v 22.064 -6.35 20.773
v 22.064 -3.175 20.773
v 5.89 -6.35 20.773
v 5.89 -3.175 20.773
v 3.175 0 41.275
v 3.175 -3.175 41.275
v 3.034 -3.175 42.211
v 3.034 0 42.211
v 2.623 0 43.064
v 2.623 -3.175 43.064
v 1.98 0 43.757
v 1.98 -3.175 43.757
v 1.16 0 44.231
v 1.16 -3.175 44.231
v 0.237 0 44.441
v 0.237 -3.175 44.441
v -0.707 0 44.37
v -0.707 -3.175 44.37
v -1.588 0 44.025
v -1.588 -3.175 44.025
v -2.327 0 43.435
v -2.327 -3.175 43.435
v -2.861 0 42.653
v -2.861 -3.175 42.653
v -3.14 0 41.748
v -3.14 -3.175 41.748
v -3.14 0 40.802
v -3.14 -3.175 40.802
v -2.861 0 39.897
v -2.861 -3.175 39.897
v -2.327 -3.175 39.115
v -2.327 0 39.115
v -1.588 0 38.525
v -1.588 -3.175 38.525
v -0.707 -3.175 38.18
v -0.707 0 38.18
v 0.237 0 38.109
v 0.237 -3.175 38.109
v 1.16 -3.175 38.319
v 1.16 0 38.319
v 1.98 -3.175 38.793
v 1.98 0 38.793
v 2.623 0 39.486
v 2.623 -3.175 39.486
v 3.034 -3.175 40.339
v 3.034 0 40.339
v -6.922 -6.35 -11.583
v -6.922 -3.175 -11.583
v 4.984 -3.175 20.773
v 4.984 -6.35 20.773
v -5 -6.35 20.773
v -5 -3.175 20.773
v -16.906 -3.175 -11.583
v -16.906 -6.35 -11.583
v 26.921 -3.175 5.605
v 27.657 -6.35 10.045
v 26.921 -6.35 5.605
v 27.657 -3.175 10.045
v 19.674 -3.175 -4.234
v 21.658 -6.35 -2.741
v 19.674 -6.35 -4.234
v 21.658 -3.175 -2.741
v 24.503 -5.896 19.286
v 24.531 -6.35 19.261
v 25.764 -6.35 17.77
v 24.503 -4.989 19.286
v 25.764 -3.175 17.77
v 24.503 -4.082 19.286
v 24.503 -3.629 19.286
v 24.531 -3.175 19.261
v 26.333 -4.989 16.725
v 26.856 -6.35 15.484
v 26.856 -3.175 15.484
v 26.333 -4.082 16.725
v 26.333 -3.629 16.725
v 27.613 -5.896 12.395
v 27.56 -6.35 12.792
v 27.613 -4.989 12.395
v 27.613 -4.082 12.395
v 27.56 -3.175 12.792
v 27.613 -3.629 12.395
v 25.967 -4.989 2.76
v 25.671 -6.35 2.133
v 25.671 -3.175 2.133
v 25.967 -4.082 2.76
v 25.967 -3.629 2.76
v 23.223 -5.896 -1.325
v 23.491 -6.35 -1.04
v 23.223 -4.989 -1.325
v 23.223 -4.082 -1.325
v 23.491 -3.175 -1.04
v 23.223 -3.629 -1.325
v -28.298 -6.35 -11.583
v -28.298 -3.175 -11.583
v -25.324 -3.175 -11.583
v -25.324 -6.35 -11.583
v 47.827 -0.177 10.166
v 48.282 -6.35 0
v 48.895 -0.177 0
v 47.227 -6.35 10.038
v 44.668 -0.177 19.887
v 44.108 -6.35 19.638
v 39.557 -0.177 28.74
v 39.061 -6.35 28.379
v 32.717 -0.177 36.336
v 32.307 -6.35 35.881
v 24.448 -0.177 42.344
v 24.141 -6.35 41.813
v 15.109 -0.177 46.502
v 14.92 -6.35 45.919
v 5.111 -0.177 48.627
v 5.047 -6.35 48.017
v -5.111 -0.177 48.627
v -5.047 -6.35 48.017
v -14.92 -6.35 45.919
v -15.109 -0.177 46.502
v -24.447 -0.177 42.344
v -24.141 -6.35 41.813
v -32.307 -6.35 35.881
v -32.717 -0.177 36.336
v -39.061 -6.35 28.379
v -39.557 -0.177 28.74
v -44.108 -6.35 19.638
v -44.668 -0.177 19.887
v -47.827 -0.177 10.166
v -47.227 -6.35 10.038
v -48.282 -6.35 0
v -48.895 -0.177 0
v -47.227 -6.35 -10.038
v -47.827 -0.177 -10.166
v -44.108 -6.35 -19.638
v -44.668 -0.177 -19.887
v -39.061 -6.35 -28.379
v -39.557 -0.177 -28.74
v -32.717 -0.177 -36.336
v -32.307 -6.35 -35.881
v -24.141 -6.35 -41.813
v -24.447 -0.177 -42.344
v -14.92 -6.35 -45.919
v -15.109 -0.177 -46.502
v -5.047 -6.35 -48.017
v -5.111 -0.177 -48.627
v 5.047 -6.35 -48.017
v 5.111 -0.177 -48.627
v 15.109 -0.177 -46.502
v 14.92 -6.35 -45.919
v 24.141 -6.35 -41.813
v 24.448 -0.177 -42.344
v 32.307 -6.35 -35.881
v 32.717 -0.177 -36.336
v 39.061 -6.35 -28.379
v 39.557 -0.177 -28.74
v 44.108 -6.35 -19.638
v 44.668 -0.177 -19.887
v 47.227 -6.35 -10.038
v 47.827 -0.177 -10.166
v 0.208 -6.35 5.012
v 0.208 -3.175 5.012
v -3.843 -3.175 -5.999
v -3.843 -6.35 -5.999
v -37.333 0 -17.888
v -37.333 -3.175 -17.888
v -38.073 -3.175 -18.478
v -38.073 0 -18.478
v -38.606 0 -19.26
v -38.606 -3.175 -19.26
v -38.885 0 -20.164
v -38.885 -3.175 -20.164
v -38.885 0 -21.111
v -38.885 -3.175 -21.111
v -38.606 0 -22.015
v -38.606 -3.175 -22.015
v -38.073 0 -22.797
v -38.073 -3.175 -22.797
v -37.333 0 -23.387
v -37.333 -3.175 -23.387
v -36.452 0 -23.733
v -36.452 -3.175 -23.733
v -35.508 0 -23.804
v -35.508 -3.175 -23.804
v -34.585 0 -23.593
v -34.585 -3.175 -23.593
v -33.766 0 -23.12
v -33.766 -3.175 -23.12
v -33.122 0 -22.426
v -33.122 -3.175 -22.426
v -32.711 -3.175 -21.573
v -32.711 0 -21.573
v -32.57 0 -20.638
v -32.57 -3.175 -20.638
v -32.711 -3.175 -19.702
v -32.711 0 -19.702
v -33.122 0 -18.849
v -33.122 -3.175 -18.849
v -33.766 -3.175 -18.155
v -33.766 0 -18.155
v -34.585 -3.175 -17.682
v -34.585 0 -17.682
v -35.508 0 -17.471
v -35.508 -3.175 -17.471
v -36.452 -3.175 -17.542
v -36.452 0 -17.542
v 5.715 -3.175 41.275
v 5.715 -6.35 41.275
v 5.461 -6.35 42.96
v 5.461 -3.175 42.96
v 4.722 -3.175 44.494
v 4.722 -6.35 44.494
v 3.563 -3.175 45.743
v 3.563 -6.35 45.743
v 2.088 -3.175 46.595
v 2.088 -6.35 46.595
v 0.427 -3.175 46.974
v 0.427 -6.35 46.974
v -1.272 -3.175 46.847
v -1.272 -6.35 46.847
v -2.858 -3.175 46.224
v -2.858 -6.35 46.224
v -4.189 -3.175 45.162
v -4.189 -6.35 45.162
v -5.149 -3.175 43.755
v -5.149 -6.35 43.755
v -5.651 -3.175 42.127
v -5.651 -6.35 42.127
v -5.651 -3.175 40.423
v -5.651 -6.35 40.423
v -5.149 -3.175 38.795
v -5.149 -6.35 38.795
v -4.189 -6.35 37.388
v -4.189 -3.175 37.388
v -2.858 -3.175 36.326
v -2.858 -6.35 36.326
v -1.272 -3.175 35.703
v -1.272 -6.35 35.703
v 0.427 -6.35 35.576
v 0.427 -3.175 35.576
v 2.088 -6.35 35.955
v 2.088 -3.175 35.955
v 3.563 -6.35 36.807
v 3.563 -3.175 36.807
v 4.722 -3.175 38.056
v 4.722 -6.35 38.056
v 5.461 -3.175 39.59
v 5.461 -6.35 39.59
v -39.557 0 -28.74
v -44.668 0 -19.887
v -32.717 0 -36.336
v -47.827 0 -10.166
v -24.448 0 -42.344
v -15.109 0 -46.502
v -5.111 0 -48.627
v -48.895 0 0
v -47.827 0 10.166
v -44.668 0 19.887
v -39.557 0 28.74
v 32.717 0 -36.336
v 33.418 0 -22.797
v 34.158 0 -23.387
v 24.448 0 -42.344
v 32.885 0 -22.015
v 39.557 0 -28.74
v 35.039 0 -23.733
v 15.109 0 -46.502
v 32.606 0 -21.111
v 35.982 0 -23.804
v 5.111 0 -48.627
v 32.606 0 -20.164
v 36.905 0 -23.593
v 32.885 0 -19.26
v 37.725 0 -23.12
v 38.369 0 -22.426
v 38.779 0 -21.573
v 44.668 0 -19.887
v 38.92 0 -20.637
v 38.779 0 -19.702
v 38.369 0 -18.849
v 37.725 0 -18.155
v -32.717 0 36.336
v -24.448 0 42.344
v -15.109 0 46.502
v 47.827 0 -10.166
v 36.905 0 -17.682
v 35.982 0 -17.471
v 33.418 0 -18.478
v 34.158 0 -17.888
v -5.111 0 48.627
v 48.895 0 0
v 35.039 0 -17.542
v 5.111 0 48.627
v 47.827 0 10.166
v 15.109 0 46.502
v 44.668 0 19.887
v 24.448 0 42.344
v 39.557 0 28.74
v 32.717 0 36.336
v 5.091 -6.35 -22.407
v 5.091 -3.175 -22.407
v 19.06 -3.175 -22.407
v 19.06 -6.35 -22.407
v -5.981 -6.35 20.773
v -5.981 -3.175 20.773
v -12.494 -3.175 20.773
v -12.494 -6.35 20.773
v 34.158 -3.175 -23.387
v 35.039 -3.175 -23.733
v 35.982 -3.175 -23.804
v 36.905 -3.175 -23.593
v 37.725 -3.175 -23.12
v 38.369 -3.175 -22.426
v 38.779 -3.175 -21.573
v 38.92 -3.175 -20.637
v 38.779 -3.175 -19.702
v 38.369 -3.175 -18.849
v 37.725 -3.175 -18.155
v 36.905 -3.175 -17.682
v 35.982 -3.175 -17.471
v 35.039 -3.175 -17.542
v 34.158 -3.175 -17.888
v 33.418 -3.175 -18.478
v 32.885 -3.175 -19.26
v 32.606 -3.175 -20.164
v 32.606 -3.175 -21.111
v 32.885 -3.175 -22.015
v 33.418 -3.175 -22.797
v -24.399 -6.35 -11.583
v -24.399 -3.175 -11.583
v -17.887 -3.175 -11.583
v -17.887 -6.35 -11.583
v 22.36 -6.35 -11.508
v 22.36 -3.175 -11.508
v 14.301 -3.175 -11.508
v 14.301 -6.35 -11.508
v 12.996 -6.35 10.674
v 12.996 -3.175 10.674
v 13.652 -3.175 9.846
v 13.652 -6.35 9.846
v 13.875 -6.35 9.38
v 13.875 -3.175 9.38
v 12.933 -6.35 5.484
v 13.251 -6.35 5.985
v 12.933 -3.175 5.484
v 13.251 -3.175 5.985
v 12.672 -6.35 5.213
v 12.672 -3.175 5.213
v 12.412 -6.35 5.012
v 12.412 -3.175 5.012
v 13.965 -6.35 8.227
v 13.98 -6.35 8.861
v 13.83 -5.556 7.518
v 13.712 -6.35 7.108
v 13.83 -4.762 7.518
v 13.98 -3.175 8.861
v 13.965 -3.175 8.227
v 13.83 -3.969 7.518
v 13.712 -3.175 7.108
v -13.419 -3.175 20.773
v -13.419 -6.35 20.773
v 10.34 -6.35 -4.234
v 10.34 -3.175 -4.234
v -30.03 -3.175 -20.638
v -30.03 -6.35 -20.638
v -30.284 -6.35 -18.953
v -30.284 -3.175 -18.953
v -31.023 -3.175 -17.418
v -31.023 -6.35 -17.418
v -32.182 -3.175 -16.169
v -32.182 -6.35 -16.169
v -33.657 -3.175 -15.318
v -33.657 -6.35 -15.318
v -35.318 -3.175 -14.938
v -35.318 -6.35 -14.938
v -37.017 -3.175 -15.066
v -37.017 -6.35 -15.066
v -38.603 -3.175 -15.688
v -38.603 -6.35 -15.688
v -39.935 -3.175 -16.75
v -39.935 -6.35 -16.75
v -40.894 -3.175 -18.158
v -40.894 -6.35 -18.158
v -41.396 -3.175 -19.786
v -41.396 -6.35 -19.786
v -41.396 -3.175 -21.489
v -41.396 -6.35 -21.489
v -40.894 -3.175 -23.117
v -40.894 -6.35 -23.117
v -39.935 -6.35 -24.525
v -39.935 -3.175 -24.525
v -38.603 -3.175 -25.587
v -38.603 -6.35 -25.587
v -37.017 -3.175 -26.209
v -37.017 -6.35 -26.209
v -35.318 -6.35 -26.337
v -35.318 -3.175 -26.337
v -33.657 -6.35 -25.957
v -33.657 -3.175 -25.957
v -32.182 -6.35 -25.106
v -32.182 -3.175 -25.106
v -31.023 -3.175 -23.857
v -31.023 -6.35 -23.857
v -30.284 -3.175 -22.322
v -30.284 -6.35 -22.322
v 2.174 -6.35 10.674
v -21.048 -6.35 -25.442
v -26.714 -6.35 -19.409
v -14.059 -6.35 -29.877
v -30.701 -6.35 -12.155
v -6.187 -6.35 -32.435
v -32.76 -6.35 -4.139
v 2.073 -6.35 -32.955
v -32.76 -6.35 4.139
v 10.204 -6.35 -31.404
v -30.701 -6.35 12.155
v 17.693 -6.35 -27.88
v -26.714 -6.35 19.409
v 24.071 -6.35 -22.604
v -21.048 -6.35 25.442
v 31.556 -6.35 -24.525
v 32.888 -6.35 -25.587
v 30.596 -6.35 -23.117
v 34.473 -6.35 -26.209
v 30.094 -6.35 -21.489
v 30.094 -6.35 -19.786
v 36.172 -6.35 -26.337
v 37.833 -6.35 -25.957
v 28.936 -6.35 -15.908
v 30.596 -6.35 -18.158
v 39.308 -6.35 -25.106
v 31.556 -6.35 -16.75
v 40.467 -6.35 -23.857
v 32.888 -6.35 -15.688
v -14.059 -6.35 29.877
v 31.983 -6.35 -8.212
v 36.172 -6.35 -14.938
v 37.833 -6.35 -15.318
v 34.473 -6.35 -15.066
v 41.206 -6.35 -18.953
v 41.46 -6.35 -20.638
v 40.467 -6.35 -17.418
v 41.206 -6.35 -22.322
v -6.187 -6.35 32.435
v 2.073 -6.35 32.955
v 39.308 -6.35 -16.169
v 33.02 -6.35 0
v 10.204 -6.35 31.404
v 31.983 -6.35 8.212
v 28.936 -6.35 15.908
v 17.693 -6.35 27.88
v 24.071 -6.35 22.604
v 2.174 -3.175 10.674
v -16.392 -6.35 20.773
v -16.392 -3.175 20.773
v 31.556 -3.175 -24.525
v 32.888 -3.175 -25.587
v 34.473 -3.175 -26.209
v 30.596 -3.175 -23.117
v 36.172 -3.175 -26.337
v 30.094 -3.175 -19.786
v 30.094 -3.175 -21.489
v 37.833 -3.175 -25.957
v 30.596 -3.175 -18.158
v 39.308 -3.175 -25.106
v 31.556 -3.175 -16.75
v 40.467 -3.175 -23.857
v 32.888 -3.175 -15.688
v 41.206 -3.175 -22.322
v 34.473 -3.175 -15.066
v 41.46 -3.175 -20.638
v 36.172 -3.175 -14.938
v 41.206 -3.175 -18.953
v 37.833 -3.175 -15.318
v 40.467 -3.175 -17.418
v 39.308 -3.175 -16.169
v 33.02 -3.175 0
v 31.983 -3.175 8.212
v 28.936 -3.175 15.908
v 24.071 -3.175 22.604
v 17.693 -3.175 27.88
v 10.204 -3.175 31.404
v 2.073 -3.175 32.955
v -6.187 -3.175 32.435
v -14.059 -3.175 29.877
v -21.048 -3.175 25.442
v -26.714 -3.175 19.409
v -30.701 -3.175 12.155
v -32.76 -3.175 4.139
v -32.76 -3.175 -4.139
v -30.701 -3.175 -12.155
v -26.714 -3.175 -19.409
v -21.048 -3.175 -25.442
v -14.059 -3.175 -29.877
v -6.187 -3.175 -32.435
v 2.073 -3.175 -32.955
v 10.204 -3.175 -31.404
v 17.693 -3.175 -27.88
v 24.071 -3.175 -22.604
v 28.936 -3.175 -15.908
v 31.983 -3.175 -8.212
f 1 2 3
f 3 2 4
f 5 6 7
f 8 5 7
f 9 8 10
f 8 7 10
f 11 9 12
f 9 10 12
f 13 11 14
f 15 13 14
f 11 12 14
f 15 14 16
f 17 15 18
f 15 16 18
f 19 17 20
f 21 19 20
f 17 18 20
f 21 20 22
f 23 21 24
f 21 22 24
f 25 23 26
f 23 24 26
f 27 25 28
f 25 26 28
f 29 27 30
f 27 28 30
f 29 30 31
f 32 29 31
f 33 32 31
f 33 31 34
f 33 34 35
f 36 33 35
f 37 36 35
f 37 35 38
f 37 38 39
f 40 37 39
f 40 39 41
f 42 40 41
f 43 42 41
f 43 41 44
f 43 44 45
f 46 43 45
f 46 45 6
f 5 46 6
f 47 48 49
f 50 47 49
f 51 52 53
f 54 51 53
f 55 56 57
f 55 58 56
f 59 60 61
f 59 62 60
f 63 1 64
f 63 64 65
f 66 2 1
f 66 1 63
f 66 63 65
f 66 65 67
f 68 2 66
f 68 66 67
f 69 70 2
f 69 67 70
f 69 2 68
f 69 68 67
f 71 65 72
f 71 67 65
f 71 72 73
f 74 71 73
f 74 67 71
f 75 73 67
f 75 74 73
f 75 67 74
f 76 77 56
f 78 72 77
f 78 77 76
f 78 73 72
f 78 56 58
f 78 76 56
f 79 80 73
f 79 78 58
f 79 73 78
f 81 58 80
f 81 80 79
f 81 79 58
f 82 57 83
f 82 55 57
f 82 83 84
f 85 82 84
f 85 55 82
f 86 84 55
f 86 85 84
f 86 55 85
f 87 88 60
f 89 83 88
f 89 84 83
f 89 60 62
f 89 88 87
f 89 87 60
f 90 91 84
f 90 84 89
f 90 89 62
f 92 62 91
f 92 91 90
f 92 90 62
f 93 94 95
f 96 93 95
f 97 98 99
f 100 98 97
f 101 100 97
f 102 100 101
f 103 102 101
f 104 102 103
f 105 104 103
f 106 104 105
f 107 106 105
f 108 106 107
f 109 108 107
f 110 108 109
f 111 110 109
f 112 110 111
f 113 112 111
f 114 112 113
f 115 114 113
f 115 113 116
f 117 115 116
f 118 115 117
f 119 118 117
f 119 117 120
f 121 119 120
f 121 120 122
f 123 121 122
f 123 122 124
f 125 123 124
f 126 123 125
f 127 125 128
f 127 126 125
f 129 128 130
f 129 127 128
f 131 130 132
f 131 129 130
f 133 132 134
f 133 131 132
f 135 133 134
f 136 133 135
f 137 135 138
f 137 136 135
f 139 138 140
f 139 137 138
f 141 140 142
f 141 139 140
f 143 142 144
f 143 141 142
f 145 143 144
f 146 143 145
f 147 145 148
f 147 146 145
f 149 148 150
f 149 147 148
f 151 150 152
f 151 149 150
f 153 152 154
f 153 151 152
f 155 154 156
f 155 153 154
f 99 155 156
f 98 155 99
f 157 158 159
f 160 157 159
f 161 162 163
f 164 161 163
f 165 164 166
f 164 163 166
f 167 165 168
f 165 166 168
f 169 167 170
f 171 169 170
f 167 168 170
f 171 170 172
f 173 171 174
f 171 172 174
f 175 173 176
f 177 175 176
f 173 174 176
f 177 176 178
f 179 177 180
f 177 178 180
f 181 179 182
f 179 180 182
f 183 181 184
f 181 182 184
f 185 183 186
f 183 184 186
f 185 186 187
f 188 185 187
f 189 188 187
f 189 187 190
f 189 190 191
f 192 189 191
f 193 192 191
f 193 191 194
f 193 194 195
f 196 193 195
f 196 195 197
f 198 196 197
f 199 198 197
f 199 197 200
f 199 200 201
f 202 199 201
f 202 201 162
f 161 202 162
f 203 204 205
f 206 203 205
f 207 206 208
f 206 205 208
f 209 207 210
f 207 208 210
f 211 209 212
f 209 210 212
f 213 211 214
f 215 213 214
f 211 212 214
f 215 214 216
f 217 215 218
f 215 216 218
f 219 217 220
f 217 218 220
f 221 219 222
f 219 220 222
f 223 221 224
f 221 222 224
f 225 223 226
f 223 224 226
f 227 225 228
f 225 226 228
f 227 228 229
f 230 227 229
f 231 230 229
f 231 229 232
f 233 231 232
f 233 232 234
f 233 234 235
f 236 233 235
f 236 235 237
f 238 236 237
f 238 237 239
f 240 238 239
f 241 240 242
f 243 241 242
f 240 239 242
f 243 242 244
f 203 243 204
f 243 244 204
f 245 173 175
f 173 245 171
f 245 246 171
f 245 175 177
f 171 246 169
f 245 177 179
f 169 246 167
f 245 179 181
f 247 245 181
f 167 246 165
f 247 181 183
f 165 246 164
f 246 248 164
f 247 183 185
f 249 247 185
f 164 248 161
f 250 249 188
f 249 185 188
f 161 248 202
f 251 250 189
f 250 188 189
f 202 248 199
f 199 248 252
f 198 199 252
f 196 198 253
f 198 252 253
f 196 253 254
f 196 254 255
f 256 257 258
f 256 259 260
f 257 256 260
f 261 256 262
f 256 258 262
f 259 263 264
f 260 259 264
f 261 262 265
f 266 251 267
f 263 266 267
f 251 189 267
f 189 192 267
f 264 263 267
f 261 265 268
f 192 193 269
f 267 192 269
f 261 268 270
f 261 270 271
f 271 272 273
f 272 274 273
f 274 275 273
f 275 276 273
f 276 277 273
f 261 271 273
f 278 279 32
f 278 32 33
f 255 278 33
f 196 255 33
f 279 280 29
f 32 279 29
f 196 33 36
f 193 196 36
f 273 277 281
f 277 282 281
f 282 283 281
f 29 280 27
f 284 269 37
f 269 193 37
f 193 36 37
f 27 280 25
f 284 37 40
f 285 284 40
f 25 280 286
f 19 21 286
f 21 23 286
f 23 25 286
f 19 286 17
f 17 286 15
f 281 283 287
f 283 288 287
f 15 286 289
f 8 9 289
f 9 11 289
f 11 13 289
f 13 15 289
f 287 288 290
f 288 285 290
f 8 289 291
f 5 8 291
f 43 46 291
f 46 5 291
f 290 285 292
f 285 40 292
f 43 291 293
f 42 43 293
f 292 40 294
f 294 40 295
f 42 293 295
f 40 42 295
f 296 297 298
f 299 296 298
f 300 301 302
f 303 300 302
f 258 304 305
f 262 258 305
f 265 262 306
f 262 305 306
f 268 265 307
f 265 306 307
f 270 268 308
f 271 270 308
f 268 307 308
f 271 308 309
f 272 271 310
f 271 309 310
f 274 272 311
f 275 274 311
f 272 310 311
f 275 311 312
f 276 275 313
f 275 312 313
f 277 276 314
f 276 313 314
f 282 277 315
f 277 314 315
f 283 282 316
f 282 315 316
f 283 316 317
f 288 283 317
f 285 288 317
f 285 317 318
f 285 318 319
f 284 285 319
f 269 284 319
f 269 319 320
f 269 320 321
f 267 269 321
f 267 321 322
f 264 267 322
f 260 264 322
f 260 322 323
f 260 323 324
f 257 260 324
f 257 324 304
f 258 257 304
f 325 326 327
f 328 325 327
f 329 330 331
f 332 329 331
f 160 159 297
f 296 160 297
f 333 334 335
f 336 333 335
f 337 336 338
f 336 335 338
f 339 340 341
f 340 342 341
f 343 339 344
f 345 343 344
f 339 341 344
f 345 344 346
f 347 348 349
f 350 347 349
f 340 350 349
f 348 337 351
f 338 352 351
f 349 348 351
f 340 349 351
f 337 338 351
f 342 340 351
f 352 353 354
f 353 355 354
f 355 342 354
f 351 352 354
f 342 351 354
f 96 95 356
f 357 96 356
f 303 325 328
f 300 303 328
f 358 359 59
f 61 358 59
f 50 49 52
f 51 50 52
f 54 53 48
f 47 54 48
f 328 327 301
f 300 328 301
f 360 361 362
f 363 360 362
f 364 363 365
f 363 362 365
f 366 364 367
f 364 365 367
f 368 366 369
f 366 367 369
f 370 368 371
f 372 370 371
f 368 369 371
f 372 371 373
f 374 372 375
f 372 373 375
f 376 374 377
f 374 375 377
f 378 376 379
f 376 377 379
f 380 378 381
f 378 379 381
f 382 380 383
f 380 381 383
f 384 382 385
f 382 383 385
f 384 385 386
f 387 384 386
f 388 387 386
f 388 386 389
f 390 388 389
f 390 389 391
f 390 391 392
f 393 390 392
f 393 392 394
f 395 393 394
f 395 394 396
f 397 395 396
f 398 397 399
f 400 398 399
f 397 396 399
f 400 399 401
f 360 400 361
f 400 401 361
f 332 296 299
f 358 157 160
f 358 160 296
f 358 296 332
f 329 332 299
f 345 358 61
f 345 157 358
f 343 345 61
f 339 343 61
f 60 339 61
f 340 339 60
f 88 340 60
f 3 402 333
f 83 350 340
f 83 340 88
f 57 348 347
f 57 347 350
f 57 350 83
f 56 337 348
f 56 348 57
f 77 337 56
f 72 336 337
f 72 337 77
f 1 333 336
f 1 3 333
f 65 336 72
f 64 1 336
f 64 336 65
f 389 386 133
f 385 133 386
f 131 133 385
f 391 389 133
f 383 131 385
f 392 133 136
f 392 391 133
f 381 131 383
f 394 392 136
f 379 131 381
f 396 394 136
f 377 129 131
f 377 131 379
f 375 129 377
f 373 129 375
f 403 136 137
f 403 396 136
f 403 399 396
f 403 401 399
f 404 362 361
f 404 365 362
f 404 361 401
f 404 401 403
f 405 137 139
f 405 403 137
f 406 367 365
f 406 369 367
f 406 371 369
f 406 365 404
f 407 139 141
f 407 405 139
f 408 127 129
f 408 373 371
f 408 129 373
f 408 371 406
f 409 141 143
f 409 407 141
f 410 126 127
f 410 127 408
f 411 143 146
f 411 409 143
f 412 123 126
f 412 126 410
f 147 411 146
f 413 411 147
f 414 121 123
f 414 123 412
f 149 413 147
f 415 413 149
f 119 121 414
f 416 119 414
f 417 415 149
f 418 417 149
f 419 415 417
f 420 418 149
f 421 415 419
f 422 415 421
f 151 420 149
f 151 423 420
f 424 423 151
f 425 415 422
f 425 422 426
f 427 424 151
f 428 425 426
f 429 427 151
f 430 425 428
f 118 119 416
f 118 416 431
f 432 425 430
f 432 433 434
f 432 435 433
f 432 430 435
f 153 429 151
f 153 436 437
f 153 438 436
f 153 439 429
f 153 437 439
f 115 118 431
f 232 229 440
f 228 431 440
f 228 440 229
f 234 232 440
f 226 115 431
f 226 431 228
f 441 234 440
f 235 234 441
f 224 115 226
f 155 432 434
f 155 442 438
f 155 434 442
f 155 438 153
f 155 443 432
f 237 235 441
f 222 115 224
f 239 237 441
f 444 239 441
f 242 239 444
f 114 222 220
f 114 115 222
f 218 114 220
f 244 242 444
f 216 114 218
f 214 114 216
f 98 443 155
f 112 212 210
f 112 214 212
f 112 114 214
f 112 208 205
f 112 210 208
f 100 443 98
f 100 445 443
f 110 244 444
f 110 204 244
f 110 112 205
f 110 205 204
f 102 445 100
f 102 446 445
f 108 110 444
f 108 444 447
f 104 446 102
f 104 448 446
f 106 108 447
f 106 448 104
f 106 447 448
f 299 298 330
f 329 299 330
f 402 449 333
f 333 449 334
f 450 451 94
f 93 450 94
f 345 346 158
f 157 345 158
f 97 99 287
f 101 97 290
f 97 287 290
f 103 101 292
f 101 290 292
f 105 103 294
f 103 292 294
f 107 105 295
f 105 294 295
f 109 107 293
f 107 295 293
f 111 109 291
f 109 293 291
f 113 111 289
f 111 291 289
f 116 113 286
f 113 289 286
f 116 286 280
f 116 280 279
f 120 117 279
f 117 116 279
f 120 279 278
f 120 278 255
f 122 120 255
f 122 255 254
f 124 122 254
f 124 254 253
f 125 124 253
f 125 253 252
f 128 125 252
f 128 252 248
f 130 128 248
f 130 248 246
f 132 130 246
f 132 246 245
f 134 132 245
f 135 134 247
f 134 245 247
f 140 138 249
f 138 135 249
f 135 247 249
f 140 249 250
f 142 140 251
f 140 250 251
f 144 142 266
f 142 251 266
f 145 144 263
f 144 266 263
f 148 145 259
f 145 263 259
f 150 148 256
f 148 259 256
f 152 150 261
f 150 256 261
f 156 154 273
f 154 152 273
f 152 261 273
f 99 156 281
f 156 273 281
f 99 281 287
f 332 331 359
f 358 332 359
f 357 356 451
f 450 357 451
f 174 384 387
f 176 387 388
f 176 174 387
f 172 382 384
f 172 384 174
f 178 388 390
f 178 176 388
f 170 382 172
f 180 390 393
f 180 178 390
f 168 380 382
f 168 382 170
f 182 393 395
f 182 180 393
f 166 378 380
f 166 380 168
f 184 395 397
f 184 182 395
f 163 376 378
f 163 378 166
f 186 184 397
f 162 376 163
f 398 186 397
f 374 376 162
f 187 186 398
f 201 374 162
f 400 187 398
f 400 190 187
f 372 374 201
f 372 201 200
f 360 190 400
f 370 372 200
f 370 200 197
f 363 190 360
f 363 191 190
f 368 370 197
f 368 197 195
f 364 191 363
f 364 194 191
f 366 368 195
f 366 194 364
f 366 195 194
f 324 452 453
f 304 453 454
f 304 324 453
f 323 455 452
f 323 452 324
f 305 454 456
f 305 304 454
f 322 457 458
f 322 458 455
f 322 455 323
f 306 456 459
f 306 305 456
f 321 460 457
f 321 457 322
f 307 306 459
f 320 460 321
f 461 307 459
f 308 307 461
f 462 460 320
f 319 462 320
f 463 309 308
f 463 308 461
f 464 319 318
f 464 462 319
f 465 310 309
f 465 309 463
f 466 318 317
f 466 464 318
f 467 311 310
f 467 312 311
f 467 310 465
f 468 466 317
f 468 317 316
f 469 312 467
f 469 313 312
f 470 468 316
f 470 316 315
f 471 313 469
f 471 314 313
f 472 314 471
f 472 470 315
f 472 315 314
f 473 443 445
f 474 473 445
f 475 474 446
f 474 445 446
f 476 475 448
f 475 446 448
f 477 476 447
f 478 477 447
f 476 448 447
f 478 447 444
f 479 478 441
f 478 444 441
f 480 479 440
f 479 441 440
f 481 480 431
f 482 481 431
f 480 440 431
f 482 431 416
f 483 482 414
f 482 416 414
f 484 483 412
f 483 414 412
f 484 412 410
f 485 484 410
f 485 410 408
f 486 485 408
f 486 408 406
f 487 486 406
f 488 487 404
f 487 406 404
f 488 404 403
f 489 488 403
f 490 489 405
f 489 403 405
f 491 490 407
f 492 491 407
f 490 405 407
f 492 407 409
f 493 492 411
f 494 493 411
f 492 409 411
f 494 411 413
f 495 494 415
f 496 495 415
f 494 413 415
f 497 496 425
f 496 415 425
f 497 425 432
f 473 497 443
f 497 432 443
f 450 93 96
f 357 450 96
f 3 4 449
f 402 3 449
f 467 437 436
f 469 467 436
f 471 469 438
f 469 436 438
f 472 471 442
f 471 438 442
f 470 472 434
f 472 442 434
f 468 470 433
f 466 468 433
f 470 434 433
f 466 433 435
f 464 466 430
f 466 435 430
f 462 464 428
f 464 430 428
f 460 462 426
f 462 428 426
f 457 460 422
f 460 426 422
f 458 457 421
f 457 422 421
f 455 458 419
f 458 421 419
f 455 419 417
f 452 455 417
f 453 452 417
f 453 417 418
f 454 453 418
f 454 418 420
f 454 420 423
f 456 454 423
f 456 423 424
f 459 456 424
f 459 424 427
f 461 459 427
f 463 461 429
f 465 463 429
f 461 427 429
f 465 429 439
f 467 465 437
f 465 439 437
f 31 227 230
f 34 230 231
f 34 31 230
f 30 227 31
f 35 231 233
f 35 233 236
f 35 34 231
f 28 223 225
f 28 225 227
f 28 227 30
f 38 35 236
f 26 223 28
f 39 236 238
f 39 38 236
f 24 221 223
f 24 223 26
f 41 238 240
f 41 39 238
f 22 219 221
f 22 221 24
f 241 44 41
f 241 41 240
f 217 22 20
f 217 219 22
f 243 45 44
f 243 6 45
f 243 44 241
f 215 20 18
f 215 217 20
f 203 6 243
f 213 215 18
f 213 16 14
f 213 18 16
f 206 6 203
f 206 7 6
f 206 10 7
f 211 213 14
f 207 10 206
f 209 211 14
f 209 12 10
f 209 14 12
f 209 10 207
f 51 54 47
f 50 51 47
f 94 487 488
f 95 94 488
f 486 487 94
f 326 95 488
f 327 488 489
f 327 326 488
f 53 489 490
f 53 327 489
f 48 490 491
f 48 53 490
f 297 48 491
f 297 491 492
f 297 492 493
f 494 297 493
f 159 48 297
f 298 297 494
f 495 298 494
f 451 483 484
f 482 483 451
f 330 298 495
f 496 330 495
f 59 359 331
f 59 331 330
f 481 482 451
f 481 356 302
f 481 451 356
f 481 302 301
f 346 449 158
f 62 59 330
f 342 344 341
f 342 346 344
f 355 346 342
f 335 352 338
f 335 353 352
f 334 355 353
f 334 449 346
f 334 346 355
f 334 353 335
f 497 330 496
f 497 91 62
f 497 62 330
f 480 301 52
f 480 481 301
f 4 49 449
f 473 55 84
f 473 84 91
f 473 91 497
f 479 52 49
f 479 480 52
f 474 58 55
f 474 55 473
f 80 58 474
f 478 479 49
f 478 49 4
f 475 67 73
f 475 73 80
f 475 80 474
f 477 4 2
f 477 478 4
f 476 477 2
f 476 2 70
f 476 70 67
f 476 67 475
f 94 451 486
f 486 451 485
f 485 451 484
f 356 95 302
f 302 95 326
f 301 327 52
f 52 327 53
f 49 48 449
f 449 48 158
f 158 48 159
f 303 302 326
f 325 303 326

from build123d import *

# Parameters (mm, degrees)
F0_R            = 48.895
F1_DEPTH        = 6.35
F2_R            = 33.02
F3_DEPTH        = 3.175
F4_R            = 3.175
F5_DEPTH        = 6.351
F5_COPIES_COUNT = 3
F6_R            = 5.715
F7_DEPTH        = 3.175
F9_DEPTH        = 3.175


# Not quite as in the source:
# - a pattern or mirror of a feature is missing from the dataset's text; its kind, count and spacing are read off the source's solid


with BuildPart() as f1:
    # F0 (on Front) → F1 (new body)
    with BuildSketch(Plane.XZ):
        Circle(F0_R)
    extrude(amount=F1_DEPTH)

    # F2 (on face) → F3 (cut)
    with BuildSketch(Plane.XZ.offset(6.35)):
        Circle(F2_R)
    extrude(amount=-F3_DEPTH, mode=Mode.SUBTRACT)

    # F4 (on face) → F5 (cut, through all)
    with BuildSketch(Plane.XZ.offset(6.35)):
        with Locations((0, 41.275)):
            Circle(F4_R)
    f5 = extrude(amount=-F5_DEPTH, mode=Mode.SUBTRACT)

    # F5_copies: F5 ×3 about axis
    f5_copies_axis = Axis((0, 0, 0), (0, 1, 0))
    for i in range(1, F5_COPIES_COUNT):
        add(f5.rotate(f5_copies_axis, i * 360 / F5_COPIES_COUNT), mode=Mode.SUBTRACT)

    # F6 (on face) → F7 (cut)
    with BuildSketch(Plane.XZ.offset(6.35)):
        with Locations((0, 41.275)):
            Circle(F6_R)
        with Locations((35.7451985412, -20.6375)):
            Circle(F6_R)
        with Locations((-35.7451985412, -20.6375)):
            Circle(F6_R)
    extrude(amount=-F7_DEPTH, mode=Mode.SUBTRACT)

    # F8 (on face) → F9 (join)
    with BuildSketch(Plane.XZ.offset(3.175)):
        Polygon((-16.3922007191, 20.7727154884), (-28.2979620914, -11.5829327573), (-25.324323939, -11.5829327573), (-13.4185625667, 20.7727154884), align=None)
        Polygon((-16.905579319, -11.5829327573), (-6.9219360217, -11.5829327573), (4.9838253506, 20.7727154884), (-4.9998179467, 20.7727154884), align=None)
        Polygon((-12.4935675046, 20.7727154884), (-24.3993288769, -11.5829327573), (-17.8866158386, -11.5829327573), (-5.9808544663, 20.7727154884), align=None)
        with BuildLine():
            Line((5.8897674028, 20.7727154884), (2.173845637, 10.6741544806))
            Line((2.173845637, 10.6741544806), (12.9963092812, 10.6741544806))
            add(Edge.make_bspline(
                [(12.9963092812, 10.6741544806), (13.3555097893, 10.2684161805), (14.1043976934, 9.4225028304), (13.9491779559, 7.5181571268), (13.1134705599, 5.5267271878), (12.6059829763, 5.1538653523), (12.4124220311, 5.0116520418)],
                knots=[0, 0, 0, 0, 0.2524611124, 0.5263496824, 0.8193449335, 1, 1, 1, 1], degree=3))
            Line((12.4124220311, 5.0116520418), (0.2083620148, 5.0116520418))
            Line((0.2083620148, 5.0116520418), (-3.8432038956, -5.9990710312))
            Line((-3.8432038956, -5.9990710312), (5.090538634, -22.4072845116))
            Line((5.090538634, -22.4072845116), (19.059962988, -22.4072845116))
            Line((19.059962988, -22.4072845116), (22.3604289031, -11.5080620742))
            Line((22.3604289031, -11.5080620742), (14.3011480982, -11.5080620742))
            Line((14.3011480982, -11.5080620742), (10.3404486879, -4.2336190018))
            Line((10.3404486879, -4.2336190018), (19.6740036189, -4.2336190018))
            add(Edge.make_bspline(
                [(22.0640265758, 20.7727154884), (22.9280250832, 20.3392576633), (24.6989276358, 19.4508168126), (26.5202053139, 16.7535424772), (27.942801324, 12.3470202028), (27.4780031336, 7.7394644811), (26.2592507252, 2.6453616364), (23.4242960391, -1.5113689868), (20.9094052375, -3.3368697093), (19.6740036189, -4.2336190018)],
                knots=[0, 0, 0, 0, 0.1175129286, 0.2408614638, 0.3885970952, 0.5383784175, 0.6968239202, 0.8510693906, 1, 1, 1, 1], degree=3))
            Line((22.0640265758, 20.7727154884), (5.8897674028, 20.7727154884))
        make_face()
    extrude(amount=F9_DEPTH)

    # F10 (on Top) → F11 (revolve, cut)
    with BuildSketch(Plane.XY):
        Polygon((48.9125326276, -6.3948447905), (48.9125326276, 0), (48.2775326276, -6.3948447905), align=None)
    revolve(axis=Axis((0, -3.4167582635, 0), (0, -1, 0)), mode=Mode.SUBTRACT)


solid = f1.part
